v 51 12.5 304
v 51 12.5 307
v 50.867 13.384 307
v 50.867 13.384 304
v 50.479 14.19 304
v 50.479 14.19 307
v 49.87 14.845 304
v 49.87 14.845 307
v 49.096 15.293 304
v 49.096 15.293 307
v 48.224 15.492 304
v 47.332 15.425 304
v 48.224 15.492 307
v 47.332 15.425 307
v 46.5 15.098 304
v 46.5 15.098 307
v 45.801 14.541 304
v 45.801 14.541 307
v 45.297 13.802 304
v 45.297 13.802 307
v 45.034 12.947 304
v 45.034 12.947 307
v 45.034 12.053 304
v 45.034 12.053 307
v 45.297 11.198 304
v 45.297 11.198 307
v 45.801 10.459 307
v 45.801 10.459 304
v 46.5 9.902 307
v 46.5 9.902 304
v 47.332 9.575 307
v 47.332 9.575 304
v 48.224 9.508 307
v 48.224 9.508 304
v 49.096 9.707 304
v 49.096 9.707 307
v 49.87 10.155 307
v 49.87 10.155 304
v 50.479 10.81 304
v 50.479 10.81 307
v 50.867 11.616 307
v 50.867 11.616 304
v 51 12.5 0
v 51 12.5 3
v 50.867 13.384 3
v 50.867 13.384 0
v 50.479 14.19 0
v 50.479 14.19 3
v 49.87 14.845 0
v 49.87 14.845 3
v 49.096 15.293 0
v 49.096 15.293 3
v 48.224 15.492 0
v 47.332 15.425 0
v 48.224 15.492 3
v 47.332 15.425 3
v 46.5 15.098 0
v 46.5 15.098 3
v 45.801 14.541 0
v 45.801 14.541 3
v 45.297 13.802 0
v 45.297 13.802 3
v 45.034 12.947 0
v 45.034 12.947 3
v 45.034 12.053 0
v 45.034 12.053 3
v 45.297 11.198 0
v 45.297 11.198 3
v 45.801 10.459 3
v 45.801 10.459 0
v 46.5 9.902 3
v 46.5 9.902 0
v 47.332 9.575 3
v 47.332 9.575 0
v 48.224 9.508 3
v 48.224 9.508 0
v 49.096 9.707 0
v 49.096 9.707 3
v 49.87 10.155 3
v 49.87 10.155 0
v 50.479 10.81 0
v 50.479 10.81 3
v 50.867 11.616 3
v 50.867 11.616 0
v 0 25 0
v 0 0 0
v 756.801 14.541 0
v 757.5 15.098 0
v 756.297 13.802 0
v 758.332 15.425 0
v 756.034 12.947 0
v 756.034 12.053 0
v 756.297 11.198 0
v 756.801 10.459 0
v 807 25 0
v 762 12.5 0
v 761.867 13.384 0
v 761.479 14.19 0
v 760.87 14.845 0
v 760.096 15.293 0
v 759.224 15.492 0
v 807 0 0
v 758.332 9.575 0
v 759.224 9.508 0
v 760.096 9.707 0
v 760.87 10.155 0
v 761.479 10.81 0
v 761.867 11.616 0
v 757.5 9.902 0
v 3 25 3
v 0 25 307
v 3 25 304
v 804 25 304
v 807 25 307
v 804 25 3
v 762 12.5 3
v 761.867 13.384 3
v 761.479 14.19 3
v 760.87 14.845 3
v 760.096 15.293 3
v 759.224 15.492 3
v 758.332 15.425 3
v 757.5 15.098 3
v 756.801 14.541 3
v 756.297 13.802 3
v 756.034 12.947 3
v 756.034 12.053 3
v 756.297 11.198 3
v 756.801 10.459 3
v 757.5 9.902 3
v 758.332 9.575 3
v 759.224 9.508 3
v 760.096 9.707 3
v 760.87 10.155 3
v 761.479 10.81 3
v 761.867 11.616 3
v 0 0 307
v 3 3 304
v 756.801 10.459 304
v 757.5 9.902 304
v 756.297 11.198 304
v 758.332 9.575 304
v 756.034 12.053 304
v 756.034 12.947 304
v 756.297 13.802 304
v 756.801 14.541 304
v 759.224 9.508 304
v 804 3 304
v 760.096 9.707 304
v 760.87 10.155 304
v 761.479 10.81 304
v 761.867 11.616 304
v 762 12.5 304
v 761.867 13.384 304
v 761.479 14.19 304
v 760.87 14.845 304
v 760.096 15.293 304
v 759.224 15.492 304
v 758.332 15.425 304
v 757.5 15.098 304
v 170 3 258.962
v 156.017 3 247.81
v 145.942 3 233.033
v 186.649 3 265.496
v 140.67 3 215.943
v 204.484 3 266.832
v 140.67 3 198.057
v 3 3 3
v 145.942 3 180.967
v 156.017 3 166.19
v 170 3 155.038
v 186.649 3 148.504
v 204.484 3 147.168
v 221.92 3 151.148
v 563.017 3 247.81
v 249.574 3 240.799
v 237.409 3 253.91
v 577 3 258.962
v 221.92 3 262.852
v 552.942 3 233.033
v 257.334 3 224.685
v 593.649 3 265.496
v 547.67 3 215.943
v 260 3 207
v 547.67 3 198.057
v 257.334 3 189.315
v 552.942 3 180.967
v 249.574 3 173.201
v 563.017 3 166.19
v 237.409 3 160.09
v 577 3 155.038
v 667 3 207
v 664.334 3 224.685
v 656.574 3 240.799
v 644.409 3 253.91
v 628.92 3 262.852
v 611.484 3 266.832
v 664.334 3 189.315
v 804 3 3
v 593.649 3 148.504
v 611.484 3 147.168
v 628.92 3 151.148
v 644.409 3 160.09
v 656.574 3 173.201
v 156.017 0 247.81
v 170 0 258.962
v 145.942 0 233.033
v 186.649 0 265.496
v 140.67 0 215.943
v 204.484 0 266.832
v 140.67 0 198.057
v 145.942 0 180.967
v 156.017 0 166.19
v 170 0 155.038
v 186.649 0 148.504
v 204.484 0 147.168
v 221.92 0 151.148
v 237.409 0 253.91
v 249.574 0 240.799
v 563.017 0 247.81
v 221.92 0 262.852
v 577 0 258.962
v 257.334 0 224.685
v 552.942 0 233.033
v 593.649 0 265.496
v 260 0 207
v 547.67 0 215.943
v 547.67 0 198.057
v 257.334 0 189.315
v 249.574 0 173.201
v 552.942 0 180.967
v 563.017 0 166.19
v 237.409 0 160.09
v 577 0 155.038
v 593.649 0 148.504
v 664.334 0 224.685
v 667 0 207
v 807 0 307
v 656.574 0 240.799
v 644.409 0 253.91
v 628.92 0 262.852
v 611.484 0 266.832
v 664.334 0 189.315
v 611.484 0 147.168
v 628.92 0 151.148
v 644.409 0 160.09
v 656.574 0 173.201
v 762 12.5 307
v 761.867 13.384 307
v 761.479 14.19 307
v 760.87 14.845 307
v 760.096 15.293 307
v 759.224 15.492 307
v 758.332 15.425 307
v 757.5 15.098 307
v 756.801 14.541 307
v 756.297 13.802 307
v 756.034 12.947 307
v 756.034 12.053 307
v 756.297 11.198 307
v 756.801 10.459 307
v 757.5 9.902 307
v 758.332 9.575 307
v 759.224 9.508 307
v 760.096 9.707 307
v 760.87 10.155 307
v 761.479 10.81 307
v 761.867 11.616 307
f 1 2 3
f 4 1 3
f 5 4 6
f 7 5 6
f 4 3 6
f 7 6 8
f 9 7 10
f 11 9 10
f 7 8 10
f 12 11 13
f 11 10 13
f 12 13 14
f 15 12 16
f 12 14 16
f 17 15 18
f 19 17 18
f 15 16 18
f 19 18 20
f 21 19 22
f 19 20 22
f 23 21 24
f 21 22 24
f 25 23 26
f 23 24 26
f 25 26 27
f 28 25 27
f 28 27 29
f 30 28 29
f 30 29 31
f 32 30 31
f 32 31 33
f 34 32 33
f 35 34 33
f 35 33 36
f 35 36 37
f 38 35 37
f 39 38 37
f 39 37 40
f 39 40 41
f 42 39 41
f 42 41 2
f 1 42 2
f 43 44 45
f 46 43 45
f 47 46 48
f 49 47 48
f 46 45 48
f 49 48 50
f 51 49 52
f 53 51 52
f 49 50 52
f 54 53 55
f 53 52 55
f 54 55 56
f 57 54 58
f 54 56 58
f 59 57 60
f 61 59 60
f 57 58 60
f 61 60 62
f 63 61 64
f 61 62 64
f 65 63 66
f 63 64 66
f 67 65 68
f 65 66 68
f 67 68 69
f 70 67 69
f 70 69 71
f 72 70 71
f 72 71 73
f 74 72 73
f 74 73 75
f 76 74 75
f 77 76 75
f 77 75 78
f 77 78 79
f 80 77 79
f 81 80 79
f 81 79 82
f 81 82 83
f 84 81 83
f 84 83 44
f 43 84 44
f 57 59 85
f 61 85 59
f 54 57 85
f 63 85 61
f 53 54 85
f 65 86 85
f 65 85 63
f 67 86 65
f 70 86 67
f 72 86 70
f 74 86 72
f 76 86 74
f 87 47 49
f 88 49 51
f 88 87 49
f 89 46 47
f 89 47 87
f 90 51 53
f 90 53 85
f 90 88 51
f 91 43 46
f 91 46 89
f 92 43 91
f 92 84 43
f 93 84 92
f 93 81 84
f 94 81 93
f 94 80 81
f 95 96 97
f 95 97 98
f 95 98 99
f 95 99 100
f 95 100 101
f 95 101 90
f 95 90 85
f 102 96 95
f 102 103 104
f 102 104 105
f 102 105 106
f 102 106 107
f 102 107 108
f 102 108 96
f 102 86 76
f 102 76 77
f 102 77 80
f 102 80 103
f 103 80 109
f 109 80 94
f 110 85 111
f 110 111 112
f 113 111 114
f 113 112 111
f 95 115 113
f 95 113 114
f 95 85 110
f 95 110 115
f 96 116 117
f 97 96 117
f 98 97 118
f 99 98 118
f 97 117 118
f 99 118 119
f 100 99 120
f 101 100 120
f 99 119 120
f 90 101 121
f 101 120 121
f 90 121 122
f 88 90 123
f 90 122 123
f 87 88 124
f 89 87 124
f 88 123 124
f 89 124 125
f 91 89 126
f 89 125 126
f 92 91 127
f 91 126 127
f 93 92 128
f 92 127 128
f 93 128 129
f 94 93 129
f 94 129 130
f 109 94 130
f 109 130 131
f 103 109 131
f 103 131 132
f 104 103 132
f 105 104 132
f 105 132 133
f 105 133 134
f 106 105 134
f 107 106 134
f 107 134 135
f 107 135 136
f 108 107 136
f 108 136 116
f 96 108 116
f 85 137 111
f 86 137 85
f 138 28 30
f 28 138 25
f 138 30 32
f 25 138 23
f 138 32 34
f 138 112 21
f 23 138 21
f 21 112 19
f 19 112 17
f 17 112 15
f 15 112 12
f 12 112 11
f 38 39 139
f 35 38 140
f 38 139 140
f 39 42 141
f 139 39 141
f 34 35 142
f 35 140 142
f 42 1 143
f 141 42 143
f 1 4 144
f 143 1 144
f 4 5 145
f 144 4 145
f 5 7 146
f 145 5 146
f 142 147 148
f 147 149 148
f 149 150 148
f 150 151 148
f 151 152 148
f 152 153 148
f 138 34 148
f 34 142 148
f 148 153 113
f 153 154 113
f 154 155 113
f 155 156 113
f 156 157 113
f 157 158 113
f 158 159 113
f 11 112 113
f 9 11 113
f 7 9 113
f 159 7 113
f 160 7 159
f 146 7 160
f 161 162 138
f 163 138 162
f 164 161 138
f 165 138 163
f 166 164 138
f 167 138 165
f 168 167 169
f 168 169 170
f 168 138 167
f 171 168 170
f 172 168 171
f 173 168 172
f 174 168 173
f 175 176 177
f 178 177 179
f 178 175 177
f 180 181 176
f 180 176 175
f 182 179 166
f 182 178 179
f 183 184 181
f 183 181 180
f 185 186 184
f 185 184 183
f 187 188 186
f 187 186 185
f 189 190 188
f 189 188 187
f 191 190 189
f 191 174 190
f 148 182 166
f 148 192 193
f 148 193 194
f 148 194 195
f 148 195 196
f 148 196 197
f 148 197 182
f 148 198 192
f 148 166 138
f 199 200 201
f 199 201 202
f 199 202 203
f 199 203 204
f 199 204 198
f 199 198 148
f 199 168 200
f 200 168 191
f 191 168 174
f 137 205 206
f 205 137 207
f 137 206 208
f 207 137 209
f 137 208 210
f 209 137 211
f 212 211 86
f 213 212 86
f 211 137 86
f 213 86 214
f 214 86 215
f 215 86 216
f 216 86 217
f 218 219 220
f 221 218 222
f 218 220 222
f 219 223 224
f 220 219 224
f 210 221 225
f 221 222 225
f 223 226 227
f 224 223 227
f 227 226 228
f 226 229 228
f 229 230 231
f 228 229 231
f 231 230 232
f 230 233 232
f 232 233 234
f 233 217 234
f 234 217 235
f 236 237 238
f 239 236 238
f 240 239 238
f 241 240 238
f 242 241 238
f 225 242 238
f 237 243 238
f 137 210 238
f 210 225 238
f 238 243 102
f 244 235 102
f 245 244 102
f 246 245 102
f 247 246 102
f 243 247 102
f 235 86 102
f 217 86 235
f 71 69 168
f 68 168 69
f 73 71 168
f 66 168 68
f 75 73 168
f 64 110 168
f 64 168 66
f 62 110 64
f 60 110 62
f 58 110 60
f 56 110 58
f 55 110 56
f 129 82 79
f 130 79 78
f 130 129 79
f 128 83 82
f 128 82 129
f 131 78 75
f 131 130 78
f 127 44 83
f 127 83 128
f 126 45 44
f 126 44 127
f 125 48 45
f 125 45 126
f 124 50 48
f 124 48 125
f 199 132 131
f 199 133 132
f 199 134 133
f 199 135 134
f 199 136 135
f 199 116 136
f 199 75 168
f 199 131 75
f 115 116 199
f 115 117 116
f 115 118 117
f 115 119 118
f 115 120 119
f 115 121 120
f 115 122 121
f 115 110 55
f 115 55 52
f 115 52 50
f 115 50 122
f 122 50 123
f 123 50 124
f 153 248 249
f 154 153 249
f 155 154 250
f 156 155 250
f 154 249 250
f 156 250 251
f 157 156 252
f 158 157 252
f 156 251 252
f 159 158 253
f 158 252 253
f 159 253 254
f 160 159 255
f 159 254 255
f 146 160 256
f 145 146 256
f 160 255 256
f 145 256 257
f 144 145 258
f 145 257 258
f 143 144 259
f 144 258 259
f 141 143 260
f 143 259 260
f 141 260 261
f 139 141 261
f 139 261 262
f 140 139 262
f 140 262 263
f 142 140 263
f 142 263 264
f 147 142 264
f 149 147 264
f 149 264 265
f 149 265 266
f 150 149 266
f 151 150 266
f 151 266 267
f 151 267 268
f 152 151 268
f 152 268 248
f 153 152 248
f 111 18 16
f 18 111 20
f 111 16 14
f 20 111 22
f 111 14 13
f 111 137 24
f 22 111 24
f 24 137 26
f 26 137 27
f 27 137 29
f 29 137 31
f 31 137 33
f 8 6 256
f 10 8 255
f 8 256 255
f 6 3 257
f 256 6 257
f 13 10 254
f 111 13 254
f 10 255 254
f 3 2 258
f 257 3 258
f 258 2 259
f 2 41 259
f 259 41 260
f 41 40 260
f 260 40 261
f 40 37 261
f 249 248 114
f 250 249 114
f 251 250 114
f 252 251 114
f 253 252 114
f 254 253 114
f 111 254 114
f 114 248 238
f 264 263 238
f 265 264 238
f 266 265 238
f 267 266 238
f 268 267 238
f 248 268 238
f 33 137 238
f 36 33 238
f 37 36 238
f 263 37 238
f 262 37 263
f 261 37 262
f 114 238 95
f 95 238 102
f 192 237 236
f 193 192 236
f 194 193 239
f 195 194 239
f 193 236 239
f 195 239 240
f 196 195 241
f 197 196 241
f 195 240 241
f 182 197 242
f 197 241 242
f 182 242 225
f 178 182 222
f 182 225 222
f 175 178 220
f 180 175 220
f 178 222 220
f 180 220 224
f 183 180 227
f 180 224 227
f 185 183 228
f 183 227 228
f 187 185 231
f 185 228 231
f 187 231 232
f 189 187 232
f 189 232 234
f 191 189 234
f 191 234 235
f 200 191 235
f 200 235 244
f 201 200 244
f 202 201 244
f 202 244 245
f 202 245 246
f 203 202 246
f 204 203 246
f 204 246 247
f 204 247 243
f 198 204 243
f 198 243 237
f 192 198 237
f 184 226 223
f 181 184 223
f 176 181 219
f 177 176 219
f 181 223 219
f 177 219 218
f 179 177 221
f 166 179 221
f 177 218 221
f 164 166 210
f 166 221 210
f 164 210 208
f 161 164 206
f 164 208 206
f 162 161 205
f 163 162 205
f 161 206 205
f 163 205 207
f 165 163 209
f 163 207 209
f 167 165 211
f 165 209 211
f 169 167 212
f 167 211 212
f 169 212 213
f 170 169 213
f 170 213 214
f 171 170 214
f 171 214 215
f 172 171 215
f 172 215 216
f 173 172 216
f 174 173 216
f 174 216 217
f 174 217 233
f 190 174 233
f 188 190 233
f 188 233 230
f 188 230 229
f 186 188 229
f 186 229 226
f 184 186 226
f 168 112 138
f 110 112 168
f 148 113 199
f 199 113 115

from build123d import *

# Parameters (mm, degrees)
SKETCH_2_W          = 807
SKETCH_2_H          = 307
EXTRUDE_1_DEPTH     = 25
SKETCH_3_W          = 801
SKETCH_3_H          = 301
CUT_EXTRUDE_1_DEPTH = 22
SKETCH_4_R          = 3
CUT_EXTRUDE_2_DEPTH = 308
SKETCH_5_R          = 60
CUT_EXTRUDE_3_DEPTH = 26


with BuildPart() as part:
    # 草圖2 → 填料-伸長1 (new body)
    with BuildSketch(Plane(origin=(0, 0, 0), x_dir=(1, 0, 0), z_dir=(0, 1, 0))):
        with Locations((403.5, -153.5)):
            Rectangle(SKETCH_2_W, SKETCH_2_H)
    extrude(amount=EXTRUDE_1_DEPTH)

    # 草圖3 → 除料-伸長1 (cut)
    with BuildSketch(Plane(origin=(0, 25, 0), x_dir=(1, 0, 0), z_dir=(0, 1, 0))):
        with Locations((403.5, -153.5)):
            Rectangle(SKETCH_3_W, SKETCH_3_H)
    extrude(amount=-CUT_EXTRUDE_1_DEPTH, mode=Mode.SUBTRACT)

    # 草圖4 → 除料-伸長2 (cut, through all)
    with BuildSketch(Plane.XY.offset(307)):
        with Locations((759, 12.5)):
            Circle(SKETCH_4_R)
        with Locations((48, 12.5)):
            Circle(SKETCH_4_R)
    extrude(amount=-CUT_EXTRUDE_2_DEPTH, mode=Mode.SUBTRACT)

    # 草圖5 → 除料-伸長3 (cut, through all)
    with BuildSketch(Plane.XZ):
        with Locations((607, 207)):
            Circle(SKETCH_5_R)
        with Locations((200, 207)):
            Circle(SKETCH_5_R)
    extrude(amount=-CUT_EXTRUDE_3_DEPTH, mode=Mode.SUBTRACT)


solid = part.part
